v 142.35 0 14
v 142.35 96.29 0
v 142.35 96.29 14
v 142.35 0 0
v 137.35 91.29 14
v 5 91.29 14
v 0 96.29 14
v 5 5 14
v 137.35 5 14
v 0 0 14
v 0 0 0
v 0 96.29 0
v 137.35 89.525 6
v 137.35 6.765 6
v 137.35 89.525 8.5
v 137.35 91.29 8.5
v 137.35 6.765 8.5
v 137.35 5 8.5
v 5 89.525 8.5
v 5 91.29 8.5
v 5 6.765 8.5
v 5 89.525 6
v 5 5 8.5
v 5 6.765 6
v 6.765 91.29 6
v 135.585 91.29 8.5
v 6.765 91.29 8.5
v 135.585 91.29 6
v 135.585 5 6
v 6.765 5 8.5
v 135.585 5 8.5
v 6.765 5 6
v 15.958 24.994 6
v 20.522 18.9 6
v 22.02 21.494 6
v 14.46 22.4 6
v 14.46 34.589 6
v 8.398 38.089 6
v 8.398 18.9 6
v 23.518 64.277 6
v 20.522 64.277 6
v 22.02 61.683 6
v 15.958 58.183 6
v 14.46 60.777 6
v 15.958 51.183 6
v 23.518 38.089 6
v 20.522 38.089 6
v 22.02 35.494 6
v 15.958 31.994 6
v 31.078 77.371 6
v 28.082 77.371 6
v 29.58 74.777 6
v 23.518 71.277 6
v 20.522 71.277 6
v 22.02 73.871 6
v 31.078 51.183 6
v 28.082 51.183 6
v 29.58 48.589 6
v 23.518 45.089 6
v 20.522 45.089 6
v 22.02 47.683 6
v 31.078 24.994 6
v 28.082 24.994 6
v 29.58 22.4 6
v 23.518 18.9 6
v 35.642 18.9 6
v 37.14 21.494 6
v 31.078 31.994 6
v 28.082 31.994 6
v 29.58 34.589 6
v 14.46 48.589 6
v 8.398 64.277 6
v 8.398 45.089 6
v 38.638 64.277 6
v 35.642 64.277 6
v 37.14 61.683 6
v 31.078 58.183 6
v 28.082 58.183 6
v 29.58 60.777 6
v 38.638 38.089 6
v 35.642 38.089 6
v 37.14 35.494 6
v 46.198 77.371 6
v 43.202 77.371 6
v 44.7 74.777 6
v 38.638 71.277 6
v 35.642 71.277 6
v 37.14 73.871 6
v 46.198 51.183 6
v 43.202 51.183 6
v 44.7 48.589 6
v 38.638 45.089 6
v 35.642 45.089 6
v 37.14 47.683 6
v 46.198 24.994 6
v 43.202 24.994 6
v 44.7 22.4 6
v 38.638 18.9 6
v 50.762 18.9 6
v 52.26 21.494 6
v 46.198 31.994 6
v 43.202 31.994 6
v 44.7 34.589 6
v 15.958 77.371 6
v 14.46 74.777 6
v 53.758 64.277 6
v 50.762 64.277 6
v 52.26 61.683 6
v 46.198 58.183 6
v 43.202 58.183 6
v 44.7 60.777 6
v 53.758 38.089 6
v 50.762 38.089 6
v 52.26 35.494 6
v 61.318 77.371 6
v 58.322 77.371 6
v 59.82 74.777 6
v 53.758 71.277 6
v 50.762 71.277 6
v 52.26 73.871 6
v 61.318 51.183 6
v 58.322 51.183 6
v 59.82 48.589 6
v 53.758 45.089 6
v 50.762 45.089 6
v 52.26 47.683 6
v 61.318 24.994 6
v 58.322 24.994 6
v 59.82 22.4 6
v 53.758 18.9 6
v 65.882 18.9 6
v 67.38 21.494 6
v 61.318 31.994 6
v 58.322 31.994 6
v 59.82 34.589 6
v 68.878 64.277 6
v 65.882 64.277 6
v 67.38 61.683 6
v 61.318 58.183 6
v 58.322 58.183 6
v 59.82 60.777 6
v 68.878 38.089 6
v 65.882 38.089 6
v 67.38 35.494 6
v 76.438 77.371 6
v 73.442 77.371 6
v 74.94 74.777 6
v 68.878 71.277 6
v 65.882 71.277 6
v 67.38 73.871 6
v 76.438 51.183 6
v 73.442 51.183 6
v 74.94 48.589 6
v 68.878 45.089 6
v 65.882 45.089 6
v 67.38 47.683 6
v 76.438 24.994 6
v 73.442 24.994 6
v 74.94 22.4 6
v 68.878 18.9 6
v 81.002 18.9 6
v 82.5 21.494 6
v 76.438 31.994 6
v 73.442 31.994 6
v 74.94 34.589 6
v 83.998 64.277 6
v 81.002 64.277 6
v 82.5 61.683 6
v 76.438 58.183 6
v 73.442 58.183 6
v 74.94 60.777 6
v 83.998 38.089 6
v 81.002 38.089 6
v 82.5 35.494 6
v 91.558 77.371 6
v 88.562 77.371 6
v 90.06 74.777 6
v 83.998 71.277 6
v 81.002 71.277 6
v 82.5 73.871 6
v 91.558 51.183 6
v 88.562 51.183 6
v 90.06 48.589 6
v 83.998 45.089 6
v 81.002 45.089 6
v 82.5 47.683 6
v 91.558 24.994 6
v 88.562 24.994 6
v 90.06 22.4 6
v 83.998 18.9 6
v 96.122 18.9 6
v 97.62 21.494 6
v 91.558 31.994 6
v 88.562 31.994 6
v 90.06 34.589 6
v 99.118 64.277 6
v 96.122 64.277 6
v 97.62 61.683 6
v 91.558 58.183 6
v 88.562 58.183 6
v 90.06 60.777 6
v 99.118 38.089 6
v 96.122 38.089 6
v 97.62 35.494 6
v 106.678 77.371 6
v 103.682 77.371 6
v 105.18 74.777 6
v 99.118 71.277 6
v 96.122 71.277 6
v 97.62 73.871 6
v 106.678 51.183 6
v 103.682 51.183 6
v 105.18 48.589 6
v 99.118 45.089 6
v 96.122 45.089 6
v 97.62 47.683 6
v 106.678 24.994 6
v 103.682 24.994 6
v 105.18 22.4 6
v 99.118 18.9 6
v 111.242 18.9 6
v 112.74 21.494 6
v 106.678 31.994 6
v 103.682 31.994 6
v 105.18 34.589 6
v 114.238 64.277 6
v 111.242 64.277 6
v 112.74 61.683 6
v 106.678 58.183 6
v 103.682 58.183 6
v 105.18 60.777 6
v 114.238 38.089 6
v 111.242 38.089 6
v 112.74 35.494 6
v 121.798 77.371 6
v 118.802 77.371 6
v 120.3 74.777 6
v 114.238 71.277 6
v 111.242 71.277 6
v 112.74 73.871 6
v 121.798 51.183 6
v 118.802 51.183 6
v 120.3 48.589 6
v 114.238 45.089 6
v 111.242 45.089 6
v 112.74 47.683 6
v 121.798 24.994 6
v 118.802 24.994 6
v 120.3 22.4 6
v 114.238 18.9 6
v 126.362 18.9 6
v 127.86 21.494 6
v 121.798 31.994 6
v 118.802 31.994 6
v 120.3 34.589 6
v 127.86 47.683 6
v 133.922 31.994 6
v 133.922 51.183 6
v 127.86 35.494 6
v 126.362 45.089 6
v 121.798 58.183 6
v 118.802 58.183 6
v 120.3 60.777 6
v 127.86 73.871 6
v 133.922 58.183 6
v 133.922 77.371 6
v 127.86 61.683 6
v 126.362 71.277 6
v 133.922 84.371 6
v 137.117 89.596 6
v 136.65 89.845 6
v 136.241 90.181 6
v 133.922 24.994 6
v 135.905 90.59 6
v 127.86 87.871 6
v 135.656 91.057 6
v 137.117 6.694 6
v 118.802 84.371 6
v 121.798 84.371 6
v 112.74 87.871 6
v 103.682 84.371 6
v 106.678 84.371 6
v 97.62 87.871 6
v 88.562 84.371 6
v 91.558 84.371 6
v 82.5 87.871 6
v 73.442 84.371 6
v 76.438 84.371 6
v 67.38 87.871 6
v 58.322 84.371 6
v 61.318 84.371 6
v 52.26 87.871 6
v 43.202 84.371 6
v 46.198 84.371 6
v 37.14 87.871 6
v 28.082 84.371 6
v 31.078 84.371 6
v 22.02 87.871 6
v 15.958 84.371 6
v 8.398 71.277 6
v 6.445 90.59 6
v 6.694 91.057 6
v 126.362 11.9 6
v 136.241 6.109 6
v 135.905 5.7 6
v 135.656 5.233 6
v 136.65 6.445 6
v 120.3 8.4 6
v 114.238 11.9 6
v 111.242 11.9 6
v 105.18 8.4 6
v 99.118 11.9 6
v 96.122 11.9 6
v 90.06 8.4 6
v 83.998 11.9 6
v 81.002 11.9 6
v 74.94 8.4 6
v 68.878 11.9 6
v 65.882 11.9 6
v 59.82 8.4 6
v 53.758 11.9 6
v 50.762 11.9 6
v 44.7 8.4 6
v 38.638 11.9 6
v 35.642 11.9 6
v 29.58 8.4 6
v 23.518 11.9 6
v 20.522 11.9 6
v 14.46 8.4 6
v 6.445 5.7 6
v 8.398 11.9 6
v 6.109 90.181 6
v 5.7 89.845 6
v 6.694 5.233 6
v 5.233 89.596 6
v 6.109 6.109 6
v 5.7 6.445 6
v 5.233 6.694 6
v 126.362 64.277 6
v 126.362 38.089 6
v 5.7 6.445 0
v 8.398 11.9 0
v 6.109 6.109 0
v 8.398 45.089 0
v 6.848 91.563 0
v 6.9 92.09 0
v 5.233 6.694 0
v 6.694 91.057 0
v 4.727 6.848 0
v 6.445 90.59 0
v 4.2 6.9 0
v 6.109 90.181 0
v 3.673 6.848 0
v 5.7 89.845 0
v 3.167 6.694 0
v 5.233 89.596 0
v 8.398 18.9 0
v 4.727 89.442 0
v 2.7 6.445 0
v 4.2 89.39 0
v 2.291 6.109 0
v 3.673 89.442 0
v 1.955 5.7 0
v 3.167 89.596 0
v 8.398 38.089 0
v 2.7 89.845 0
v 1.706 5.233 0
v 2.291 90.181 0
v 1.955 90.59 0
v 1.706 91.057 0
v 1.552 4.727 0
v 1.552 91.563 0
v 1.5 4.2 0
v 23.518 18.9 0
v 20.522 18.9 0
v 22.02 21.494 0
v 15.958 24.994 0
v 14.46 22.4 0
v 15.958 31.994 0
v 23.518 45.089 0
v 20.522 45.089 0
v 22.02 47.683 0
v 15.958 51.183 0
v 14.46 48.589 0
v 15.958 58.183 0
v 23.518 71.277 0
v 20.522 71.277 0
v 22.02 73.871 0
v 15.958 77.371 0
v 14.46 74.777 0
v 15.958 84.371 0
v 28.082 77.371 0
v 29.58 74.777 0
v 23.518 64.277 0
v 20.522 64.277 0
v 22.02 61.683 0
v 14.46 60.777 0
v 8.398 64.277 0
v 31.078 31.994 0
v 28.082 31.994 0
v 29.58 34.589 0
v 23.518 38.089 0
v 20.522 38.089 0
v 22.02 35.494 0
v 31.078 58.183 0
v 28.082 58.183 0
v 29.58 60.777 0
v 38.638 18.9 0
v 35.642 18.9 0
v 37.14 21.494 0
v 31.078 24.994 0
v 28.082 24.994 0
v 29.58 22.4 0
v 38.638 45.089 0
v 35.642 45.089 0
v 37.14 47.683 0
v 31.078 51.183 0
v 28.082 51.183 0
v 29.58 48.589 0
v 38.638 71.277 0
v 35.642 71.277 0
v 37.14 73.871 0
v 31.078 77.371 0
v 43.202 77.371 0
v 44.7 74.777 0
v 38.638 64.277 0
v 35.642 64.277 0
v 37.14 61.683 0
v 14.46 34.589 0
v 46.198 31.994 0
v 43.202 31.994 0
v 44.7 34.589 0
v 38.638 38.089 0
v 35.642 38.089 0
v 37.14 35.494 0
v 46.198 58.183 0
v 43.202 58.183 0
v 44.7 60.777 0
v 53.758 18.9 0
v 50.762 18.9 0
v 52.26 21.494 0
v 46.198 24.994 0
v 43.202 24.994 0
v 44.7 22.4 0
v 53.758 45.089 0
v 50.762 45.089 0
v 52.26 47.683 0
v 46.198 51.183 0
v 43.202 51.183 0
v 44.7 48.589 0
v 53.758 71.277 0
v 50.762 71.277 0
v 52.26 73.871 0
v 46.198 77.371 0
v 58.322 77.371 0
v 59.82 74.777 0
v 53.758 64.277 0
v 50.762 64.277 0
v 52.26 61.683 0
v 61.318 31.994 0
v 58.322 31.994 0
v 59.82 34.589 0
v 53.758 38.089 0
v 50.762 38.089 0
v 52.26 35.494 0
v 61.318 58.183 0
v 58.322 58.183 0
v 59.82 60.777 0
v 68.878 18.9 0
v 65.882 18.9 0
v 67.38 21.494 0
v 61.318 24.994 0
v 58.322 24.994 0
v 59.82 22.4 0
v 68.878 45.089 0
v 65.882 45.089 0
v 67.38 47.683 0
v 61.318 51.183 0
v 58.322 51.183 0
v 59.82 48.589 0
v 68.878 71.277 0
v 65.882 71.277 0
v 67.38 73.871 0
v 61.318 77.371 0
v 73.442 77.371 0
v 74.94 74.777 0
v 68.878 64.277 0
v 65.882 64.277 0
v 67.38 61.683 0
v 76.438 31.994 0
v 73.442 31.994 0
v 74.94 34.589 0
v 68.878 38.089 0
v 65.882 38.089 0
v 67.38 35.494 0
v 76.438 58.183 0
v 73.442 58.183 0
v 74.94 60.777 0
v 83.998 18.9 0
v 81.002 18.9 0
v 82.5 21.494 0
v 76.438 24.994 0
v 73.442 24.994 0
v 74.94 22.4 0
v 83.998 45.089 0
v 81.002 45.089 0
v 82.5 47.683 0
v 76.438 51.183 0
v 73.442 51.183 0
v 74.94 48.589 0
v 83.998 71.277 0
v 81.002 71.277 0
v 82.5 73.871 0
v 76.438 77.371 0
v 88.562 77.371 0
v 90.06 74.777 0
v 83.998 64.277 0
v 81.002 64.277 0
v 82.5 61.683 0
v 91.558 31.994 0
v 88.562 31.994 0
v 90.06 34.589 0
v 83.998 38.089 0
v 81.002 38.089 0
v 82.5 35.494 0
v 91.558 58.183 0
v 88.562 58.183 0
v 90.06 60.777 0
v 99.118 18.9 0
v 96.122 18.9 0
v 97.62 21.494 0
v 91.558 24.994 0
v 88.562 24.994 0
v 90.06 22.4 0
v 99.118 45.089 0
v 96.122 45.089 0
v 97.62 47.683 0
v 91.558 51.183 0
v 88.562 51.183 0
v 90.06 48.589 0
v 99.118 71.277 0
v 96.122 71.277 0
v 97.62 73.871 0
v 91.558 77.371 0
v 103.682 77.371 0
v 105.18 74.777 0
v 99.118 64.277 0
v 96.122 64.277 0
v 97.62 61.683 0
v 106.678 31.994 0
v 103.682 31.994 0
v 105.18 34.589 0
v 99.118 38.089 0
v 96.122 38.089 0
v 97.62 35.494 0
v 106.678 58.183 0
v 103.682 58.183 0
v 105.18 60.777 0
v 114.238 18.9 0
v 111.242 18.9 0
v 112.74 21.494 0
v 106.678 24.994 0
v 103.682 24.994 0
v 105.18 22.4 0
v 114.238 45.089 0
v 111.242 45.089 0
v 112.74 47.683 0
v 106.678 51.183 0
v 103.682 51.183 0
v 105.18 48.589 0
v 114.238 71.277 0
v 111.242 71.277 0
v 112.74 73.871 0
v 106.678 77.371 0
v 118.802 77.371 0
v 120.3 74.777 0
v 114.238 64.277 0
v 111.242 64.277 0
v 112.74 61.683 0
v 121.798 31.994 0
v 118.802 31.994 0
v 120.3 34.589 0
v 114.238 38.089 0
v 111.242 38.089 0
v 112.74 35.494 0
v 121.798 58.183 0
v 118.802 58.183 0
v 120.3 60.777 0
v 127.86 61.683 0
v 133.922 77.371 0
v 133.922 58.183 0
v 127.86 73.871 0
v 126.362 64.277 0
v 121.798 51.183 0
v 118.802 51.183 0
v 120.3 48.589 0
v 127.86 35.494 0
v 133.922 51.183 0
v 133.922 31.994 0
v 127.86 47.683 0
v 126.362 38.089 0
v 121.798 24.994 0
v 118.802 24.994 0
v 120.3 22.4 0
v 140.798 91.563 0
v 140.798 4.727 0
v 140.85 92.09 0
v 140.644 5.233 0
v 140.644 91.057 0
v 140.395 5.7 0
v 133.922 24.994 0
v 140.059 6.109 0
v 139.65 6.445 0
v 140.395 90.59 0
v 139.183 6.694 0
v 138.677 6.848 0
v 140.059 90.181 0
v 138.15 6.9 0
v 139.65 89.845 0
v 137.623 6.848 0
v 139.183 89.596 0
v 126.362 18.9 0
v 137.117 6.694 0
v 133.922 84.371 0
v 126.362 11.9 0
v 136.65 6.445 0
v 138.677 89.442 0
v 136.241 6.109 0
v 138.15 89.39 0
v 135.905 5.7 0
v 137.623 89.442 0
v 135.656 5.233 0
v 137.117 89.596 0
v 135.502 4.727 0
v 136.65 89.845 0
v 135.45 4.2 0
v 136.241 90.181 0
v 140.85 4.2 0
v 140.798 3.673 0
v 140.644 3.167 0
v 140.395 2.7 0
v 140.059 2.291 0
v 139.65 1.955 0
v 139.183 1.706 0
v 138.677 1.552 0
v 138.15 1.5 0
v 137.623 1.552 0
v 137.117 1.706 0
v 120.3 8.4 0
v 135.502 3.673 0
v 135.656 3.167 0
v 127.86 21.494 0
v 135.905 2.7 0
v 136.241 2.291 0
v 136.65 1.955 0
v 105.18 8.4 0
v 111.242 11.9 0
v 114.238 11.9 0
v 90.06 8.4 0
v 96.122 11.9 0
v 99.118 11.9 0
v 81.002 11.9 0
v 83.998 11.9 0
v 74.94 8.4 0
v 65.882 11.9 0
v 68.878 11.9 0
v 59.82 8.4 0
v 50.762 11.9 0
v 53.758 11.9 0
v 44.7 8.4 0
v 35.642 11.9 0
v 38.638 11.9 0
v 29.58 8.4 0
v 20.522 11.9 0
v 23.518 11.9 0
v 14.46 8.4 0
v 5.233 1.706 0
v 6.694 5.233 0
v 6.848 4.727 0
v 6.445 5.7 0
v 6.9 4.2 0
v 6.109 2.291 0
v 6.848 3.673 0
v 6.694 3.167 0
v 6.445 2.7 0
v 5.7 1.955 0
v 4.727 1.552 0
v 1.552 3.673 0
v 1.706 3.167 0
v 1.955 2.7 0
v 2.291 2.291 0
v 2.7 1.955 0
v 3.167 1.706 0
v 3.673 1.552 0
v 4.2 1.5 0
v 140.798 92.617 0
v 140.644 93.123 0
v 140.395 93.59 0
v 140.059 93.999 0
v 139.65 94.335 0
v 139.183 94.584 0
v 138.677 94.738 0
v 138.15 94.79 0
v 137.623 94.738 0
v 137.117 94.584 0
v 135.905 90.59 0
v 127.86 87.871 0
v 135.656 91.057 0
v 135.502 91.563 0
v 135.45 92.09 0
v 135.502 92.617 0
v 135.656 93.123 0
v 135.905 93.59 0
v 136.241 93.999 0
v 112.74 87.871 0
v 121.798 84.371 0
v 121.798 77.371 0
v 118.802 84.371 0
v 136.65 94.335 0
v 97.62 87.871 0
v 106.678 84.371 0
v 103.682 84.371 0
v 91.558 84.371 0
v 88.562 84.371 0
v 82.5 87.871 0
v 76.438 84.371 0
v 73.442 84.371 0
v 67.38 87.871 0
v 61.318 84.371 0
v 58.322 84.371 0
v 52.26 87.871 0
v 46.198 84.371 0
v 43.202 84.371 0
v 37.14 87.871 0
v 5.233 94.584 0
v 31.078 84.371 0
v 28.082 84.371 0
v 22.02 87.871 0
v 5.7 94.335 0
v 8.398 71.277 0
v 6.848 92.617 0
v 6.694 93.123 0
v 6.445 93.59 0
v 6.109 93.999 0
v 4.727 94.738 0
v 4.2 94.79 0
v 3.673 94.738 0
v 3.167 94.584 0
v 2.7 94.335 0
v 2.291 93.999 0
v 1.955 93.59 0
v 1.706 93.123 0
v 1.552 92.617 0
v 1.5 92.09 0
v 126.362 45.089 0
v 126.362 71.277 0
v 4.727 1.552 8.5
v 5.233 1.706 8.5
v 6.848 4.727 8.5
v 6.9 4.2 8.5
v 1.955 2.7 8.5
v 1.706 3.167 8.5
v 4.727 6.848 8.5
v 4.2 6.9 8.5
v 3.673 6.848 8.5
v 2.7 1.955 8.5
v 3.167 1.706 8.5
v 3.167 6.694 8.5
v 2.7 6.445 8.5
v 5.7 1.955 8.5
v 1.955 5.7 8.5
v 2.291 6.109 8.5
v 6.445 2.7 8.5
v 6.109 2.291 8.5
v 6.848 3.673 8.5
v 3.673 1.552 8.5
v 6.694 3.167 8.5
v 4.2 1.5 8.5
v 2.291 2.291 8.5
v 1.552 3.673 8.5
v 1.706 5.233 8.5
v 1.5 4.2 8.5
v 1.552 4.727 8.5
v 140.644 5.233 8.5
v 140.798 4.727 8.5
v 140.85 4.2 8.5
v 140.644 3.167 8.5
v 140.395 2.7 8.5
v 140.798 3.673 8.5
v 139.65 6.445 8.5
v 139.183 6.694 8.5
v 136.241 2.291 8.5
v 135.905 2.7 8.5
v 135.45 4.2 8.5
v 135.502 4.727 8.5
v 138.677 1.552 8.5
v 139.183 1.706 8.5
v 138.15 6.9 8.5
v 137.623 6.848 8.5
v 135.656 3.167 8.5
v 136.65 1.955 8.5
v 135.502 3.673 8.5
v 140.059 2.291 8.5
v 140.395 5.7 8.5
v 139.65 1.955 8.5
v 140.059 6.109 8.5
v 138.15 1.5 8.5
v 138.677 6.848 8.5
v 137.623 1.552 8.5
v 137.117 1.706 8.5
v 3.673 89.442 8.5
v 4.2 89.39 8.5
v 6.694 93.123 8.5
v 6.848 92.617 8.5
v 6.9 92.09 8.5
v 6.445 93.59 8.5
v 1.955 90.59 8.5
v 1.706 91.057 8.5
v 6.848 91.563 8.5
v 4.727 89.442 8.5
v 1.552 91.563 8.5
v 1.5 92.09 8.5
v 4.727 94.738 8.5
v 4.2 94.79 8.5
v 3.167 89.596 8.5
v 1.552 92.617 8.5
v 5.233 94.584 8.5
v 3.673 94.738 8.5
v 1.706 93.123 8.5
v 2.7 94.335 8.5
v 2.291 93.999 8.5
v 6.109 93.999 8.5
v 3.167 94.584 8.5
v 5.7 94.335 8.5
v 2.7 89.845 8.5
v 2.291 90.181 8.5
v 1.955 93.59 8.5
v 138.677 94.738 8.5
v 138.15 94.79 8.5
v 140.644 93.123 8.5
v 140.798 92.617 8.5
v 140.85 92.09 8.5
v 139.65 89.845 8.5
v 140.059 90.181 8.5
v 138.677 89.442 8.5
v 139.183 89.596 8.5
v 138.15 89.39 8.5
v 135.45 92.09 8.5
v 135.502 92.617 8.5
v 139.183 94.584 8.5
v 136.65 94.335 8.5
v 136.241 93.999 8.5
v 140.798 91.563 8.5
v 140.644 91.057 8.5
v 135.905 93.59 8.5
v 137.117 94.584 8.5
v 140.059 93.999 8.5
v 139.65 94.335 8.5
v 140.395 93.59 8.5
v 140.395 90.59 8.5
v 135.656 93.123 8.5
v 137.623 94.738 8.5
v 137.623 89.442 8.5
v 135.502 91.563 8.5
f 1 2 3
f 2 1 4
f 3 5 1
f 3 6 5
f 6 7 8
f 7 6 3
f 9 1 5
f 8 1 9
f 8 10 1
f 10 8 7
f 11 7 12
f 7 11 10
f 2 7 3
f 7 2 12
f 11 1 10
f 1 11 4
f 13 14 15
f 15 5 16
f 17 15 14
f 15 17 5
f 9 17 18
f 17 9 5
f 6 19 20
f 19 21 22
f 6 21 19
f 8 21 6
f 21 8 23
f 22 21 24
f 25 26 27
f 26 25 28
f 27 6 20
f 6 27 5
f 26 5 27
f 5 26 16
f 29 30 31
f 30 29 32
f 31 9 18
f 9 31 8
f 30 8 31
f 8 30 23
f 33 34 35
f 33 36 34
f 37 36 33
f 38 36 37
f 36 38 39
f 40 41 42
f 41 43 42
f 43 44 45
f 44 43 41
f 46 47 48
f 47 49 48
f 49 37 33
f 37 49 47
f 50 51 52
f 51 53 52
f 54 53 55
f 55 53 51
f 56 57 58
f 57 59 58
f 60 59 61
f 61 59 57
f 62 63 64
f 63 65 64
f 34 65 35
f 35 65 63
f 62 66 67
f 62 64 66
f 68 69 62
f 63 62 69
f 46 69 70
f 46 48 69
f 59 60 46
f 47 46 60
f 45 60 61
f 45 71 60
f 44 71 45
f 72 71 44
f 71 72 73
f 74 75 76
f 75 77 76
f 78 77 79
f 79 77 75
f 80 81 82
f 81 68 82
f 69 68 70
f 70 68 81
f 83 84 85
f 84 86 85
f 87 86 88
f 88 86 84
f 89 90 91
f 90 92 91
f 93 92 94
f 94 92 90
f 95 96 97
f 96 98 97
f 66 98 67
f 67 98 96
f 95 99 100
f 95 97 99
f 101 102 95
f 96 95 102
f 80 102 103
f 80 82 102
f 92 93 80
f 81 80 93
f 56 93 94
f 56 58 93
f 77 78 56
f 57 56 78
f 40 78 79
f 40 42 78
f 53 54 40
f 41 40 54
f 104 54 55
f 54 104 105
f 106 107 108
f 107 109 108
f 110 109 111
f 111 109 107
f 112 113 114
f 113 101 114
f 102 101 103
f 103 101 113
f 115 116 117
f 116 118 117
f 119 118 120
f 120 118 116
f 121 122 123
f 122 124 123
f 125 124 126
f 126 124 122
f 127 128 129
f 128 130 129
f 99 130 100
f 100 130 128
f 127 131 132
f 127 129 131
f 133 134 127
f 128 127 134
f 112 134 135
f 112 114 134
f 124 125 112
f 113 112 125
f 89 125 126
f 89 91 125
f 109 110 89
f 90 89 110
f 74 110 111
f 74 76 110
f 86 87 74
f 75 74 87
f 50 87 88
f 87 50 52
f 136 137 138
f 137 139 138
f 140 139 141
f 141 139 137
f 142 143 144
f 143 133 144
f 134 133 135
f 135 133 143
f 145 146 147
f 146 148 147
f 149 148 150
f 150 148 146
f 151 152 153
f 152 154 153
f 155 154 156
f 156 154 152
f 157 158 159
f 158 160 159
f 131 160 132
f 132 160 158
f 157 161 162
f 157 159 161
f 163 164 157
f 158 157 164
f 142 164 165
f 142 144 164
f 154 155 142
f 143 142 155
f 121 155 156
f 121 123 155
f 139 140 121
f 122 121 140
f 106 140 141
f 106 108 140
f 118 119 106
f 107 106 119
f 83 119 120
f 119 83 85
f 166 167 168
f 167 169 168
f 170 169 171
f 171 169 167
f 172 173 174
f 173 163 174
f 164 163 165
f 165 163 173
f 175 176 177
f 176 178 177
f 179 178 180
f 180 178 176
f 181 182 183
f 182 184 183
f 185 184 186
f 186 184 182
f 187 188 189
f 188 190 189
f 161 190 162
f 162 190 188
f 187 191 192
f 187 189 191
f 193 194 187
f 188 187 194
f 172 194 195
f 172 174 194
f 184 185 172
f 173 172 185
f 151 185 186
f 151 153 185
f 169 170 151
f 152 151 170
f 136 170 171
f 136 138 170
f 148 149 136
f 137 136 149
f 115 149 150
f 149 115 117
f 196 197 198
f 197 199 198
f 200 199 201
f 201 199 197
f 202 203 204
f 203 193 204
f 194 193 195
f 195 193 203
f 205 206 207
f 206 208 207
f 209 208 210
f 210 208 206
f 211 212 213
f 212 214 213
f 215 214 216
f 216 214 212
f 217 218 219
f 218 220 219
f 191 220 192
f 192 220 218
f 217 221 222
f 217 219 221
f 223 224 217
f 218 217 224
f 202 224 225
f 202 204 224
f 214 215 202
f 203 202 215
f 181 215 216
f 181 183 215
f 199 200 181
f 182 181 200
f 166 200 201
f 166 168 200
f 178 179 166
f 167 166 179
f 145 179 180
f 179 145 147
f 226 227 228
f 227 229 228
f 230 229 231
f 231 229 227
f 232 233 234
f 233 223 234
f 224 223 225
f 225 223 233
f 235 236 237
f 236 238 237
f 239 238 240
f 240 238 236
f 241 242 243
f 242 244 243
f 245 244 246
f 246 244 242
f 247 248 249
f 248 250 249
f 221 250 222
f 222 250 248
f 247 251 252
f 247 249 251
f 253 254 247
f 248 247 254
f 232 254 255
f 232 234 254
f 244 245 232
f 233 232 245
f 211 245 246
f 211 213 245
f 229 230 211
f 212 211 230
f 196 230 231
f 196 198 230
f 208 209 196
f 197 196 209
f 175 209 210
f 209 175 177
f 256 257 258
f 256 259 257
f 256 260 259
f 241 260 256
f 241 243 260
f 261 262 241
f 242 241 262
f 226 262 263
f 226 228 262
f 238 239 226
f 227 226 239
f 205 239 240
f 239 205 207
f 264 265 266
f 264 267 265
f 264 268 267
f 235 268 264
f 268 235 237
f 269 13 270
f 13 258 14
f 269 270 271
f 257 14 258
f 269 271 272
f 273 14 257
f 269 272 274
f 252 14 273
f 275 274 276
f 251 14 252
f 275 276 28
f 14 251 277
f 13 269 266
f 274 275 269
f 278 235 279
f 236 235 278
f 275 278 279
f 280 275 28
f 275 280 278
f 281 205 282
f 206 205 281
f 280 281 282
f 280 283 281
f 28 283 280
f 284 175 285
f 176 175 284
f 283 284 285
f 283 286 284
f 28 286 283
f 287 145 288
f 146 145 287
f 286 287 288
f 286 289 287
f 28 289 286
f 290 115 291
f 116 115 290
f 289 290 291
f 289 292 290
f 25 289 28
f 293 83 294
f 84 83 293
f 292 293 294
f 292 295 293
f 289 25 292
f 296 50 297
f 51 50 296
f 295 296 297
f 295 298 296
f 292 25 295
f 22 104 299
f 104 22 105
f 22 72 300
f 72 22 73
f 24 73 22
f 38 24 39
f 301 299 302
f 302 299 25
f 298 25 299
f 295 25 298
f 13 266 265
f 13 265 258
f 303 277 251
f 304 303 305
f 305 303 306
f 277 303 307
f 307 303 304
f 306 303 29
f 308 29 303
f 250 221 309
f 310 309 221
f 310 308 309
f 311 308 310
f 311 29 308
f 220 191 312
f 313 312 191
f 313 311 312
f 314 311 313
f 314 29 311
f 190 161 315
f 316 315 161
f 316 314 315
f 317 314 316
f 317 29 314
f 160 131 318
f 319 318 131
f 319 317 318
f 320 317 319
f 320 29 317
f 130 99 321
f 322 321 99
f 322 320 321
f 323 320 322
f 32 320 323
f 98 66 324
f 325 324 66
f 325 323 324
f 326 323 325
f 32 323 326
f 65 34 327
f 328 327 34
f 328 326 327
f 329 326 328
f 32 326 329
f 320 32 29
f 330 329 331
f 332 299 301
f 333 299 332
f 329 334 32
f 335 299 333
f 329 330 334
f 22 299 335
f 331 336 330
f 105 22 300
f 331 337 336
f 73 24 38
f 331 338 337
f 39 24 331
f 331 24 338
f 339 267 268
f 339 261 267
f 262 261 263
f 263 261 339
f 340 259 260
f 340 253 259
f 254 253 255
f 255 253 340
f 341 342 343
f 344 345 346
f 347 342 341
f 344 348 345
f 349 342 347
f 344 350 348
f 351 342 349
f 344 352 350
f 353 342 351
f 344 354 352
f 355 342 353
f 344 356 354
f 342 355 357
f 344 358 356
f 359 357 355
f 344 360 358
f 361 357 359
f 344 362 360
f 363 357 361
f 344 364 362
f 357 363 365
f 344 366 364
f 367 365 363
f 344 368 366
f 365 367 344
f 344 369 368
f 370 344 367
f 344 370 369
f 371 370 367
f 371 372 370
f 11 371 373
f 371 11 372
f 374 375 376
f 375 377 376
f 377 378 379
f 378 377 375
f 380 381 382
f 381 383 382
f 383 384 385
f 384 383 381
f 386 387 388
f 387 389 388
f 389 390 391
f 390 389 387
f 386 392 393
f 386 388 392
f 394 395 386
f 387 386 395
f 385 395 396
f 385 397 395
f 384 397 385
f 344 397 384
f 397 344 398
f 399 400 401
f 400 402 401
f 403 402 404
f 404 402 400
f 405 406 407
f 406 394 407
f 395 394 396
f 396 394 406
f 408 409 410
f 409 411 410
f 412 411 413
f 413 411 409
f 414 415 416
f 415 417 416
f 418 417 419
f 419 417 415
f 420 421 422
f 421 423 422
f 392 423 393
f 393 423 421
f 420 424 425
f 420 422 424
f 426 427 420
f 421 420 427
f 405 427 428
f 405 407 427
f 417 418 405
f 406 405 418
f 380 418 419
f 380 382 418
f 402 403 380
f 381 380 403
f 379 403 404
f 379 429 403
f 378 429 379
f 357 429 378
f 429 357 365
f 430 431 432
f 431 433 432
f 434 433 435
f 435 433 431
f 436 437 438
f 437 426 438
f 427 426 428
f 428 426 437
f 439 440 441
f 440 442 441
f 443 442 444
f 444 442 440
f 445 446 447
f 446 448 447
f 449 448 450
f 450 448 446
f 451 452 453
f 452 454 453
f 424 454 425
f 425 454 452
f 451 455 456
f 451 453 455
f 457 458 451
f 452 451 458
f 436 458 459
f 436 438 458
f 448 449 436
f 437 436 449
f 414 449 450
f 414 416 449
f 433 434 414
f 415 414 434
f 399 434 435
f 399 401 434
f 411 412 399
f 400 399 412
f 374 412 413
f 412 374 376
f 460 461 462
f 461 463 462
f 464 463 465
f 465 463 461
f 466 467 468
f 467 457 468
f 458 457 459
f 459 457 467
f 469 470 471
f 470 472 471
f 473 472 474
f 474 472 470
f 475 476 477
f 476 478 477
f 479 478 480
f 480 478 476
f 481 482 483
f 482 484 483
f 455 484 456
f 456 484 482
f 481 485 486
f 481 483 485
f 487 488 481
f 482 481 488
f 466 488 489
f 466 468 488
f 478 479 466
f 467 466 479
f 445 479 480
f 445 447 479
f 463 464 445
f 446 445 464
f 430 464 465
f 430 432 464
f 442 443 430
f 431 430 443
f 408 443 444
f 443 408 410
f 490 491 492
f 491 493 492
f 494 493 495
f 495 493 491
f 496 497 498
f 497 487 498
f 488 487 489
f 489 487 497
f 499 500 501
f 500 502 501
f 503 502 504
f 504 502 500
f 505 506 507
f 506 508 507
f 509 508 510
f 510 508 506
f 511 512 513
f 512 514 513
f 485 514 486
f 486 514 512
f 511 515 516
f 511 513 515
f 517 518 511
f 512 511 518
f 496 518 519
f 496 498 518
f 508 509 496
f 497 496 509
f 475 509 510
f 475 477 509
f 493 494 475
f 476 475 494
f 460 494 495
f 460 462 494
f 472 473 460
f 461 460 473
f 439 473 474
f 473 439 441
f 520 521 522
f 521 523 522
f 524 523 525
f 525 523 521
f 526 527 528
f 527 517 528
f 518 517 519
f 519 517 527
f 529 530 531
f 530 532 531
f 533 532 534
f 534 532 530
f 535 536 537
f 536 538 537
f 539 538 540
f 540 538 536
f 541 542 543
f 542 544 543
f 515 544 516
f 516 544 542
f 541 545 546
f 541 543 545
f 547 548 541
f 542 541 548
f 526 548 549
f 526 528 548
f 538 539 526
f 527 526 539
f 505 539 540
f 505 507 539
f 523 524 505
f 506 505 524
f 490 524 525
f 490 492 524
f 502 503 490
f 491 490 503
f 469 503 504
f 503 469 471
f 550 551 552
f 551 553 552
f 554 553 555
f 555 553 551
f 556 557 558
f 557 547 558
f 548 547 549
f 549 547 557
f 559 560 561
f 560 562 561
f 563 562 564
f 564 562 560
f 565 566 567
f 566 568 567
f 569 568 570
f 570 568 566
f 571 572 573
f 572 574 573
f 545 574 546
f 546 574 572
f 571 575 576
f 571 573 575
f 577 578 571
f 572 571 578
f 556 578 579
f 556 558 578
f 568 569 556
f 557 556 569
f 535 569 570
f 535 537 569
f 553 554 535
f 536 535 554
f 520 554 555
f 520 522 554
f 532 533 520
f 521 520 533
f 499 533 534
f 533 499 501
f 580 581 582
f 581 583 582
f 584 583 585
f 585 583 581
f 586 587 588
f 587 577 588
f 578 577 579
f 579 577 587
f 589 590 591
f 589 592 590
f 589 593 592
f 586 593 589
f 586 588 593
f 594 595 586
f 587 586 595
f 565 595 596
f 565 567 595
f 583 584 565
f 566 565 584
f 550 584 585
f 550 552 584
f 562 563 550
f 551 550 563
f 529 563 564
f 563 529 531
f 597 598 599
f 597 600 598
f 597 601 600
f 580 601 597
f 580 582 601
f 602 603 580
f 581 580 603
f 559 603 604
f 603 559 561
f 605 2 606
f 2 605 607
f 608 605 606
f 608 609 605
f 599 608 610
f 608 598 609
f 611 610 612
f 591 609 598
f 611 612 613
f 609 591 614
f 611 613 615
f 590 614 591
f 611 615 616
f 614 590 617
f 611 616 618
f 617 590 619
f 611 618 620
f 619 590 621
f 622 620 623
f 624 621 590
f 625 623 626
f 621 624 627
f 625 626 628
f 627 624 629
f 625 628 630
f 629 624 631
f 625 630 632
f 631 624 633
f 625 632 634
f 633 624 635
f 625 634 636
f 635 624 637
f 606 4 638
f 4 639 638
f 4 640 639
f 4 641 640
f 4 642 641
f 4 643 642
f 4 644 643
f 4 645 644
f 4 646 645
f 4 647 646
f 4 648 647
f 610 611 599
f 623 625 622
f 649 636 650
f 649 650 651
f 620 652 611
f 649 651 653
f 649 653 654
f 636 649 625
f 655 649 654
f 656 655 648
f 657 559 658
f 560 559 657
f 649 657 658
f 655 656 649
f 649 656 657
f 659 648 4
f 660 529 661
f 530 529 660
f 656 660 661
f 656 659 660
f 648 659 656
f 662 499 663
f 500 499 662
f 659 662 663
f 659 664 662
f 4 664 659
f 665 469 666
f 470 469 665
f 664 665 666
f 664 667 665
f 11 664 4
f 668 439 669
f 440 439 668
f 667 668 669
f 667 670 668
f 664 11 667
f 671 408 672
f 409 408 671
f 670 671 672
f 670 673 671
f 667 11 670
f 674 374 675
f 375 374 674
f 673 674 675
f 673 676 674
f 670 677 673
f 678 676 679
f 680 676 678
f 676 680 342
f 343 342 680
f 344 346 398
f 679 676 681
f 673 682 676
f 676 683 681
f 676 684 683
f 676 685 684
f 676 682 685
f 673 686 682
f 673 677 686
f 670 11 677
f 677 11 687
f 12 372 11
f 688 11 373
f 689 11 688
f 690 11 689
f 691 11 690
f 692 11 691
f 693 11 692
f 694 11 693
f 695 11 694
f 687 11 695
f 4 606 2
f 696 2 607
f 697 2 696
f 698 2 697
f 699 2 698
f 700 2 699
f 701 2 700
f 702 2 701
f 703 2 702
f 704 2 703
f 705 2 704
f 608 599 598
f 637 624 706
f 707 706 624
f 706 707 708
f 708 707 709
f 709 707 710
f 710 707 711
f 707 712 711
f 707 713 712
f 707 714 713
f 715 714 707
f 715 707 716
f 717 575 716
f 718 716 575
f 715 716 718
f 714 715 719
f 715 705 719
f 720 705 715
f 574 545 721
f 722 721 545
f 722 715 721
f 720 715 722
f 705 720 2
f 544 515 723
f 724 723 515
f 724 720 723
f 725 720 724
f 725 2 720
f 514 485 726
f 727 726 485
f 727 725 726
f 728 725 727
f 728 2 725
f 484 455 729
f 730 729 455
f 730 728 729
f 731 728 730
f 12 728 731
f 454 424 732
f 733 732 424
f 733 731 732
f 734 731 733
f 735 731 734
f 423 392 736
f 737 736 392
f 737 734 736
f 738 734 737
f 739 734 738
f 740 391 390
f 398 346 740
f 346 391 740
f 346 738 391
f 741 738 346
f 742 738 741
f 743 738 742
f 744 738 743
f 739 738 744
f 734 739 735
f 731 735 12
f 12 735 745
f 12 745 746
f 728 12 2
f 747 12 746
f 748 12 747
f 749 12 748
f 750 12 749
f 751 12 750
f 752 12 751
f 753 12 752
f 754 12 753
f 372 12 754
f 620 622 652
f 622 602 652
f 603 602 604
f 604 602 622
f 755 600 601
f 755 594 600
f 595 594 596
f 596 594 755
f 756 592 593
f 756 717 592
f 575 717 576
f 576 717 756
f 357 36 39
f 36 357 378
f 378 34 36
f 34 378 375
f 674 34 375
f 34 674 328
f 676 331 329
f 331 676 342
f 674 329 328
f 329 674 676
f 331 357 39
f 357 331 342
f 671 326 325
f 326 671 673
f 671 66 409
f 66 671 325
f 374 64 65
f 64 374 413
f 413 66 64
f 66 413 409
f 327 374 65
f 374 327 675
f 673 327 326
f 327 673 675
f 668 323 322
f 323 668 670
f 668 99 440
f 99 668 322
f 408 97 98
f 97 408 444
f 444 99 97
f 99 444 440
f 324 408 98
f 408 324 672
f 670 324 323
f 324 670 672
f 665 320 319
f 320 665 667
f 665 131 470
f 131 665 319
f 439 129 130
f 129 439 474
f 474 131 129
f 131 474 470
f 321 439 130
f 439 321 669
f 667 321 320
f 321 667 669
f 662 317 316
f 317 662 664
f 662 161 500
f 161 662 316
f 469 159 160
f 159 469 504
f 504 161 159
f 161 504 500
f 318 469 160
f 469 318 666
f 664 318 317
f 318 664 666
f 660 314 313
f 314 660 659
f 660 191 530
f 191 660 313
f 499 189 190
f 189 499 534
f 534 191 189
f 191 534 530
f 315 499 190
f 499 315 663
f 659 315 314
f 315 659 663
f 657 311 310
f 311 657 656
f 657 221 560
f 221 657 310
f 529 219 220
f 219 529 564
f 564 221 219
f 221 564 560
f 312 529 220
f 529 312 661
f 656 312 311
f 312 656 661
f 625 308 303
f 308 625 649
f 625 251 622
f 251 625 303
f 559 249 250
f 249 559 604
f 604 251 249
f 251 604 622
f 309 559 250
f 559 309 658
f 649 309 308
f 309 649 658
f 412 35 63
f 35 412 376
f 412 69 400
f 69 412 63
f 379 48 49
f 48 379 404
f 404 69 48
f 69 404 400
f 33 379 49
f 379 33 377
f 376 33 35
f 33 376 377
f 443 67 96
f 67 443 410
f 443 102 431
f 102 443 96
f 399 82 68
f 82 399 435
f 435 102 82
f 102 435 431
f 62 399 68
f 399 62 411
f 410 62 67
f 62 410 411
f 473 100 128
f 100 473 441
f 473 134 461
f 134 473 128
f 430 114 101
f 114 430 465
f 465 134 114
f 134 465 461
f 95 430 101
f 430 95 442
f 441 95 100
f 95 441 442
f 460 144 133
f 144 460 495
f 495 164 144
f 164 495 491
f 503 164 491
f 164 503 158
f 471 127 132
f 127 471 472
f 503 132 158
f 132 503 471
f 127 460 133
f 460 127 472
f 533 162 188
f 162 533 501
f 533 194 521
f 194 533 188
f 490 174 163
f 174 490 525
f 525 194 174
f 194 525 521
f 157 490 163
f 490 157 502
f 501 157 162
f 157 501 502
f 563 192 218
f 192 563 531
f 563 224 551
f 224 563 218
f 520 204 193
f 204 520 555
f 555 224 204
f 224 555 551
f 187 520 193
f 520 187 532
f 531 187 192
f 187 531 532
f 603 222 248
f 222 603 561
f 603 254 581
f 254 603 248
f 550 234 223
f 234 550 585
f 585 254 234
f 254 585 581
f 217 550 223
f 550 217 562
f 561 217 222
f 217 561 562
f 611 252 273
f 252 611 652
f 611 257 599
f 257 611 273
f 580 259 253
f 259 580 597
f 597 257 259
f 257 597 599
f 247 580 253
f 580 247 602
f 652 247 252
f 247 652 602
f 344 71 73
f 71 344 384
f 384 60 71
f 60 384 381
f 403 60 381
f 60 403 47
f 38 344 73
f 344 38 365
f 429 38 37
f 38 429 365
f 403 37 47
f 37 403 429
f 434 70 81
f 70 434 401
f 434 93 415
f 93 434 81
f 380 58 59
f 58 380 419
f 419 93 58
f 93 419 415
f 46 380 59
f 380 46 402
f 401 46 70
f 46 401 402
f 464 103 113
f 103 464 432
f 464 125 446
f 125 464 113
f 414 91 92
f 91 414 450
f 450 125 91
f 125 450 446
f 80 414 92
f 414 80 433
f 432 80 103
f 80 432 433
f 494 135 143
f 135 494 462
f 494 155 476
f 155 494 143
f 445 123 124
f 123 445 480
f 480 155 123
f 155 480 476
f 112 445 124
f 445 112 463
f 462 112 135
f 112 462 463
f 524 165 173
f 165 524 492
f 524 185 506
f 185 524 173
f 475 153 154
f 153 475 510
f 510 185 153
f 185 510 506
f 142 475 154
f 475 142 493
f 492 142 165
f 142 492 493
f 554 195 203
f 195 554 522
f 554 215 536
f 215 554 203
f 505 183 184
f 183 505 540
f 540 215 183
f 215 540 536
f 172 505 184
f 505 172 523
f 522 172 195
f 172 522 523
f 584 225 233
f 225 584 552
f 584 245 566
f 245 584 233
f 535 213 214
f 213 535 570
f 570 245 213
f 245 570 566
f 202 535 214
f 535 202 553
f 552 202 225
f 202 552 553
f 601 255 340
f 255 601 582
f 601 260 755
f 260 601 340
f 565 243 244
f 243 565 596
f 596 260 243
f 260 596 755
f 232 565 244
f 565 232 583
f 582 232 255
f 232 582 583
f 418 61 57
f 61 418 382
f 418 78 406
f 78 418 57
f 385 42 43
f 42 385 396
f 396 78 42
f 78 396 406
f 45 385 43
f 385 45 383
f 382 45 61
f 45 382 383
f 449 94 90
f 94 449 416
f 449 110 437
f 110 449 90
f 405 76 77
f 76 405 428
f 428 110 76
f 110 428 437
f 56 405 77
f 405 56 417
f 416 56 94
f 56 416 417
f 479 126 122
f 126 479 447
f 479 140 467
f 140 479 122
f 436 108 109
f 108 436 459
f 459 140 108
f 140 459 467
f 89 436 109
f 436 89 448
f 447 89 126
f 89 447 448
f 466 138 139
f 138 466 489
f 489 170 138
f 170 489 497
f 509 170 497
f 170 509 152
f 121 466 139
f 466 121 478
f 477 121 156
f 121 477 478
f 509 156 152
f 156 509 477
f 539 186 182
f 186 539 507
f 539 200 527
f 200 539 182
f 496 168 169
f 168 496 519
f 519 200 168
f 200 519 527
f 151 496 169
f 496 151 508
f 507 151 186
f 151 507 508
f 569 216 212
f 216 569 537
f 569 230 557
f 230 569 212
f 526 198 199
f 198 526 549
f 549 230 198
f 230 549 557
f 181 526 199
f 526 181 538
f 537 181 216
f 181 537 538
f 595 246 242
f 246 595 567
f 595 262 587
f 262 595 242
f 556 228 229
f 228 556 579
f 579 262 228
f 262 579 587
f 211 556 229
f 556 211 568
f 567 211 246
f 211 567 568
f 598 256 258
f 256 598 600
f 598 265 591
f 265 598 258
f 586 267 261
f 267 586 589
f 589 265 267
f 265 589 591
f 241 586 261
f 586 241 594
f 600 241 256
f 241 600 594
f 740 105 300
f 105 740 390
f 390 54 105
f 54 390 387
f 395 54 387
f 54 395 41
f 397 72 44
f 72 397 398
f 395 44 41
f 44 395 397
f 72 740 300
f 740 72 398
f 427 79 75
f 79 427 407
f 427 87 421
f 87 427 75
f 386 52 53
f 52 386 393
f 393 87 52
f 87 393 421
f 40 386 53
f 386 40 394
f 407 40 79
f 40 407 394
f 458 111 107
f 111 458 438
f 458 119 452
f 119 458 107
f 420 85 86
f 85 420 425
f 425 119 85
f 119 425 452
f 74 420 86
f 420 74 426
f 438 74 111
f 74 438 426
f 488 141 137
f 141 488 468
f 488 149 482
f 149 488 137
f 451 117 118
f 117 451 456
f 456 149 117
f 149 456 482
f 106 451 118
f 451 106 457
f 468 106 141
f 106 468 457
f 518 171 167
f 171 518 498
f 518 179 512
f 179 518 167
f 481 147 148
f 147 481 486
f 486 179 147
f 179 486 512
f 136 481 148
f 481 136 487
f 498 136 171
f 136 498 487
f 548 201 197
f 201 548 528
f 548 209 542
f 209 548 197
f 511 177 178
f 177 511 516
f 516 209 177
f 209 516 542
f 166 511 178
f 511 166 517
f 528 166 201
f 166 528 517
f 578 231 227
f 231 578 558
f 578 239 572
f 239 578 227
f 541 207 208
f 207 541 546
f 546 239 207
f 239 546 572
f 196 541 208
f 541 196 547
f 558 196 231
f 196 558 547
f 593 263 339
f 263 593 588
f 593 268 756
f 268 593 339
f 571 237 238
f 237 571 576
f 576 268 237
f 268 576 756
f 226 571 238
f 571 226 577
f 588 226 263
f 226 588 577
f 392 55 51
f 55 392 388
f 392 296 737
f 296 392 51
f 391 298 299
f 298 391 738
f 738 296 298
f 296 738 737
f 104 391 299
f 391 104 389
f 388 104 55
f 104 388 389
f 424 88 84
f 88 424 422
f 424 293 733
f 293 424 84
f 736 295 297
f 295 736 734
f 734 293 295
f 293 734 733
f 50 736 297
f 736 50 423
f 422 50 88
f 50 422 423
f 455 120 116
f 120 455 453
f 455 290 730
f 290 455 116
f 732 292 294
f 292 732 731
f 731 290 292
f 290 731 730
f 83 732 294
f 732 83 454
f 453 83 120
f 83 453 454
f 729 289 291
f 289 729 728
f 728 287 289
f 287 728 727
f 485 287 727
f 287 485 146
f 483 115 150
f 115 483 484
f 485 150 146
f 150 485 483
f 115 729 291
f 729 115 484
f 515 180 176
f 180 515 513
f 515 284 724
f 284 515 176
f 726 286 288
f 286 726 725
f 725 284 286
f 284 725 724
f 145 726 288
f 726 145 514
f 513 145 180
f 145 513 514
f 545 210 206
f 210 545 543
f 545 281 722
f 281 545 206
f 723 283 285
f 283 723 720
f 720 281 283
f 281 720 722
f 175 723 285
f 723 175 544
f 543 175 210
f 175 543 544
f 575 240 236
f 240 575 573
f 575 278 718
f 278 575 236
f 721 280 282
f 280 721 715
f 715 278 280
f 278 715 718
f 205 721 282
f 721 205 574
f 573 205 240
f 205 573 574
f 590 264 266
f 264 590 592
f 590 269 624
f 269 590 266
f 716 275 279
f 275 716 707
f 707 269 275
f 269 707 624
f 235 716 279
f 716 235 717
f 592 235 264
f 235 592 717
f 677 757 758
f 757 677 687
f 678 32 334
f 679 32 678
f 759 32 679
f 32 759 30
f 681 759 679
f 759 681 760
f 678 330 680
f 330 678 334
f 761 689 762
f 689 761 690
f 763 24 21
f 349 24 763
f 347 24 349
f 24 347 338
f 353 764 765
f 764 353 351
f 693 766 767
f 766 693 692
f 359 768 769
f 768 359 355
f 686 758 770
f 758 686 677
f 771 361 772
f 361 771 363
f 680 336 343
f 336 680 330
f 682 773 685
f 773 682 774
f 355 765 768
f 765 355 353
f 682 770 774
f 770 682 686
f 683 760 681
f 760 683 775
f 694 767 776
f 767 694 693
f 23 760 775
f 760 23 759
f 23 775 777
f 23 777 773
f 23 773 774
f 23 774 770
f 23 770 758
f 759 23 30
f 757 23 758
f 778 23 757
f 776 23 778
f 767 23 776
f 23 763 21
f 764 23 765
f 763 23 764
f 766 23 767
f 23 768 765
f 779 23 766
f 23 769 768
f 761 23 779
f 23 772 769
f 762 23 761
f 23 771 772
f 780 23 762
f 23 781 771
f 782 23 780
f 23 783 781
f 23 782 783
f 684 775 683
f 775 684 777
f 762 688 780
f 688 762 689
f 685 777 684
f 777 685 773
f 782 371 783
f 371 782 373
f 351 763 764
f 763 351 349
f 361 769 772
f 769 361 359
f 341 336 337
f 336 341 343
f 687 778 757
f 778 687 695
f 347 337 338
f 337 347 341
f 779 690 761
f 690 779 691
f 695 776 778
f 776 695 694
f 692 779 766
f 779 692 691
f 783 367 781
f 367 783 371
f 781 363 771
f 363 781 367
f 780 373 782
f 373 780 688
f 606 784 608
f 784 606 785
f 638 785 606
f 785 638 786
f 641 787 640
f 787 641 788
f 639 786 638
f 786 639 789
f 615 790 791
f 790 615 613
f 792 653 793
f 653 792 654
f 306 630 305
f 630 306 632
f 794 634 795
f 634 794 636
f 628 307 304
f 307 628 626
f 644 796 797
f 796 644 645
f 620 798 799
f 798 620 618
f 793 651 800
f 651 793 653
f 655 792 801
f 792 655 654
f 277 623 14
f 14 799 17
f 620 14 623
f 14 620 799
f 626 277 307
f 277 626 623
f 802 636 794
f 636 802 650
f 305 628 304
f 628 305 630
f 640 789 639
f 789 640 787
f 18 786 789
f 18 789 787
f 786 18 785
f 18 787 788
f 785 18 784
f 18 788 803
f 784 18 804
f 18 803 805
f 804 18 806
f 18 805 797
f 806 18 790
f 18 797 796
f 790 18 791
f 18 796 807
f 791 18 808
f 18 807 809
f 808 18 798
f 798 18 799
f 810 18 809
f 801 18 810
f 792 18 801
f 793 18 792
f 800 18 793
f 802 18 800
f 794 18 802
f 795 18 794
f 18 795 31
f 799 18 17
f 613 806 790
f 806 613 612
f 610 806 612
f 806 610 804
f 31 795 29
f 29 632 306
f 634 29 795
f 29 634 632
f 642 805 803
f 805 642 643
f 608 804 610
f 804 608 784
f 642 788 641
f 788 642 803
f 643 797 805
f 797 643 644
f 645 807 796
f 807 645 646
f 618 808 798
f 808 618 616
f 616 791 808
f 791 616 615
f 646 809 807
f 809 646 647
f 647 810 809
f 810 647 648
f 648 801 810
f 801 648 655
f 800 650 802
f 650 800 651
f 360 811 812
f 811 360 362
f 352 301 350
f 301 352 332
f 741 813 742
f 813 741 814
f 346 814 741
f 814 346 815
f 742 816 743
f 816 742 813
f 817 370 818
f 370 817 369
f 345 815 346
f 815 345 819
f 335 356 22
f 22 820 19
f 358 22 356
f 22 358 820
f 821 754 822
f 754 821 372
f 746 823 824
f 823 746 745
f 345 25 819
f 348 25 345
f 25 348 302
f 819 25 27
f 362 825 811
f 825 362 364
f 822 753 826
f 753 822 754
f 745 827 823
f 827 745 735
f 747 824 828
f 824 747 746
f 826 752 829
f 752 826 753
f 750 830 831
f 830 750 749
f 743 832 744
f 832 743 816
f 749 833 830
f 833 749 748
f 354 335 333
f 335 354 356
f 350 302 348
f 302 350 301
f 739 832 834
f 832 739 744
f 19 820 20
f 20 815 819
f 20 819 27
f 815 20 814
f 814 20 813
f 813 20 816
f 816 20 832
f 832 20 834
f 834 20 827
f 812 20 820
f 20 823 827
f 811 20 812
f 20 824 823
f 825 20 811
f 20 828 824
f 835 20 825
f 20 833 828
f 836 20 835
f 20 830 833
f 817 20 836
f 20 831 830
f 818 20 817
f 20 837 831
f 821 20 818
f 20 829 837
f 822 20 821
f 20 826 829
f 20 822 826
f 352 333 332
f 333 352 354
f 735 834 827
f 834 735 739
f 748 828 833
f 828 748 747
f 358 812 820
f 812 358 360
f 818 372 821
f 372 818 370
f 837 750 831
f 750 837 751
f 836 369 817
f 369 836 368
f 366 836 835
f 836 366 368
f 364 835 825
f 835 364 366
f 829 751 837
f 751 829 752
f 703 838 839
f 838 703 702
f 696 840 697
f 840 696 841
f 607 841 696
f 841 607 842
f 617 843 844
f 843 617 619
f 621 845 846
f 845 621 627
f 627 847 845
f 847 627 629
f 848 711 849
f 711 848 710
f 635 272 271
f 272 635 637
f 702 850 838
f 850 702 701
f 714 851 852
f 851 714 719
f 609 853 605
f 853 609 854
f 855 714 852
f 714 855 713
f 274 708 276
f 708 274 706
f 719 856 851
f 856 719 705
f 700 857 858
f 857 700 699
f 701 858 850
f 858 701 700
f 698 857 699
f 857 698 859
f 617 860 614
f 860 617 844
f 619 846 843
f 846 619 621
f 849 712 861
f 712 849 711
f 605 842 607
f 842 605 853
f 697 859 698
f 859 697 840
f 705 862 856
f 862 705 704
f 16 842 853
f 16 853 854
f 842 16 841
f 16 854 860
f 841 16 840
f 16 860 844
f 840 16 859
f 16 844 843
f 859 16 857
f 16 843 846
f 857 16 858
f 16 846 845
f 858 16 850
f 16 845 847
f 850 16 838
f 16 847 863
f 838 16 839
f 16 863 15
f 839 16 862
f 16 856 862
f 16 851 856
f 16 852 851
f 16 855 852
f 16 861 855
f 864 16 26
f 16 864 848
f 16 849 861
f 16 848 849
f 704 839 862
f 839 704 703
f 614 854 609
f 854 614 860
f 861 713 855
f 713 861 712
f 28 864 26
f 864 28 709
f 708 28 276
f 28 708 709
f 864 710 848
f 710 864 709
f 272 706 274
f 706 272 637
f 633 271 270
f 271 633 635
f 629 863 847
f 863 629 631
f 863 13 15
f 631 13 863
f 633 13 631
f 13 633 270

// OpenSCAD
$fn = 32;

// ----------------------------------------------------------------------
// Honeycomb panel: 142.35 x 96.29 mm, 48 cells of 14 mm
// ----------------------------------------------------------------------

// --- parameters (mm) ---
panel_w = 142.35;         // panel width
panel_d = 96.29;          // panel depth
thick = 6;                // panel thickness
cell_r = 7;               // hex cell circumradius
pitch = 15.12;            // hex cell pitch (centre to centre)
web = 3;                  // web between the cells
columns = 8;              // columns of cells
rows = 6;                 // rows of cells
cell_count = 48;          // total cells
shift_x = 14.46;          // first cell offset in x
shift_y = 15.4;           // first cell offset in y
mount_d = 5.4;            // corner mounting holes
hole_off = 4.2;           // mounting hole offset from the corners
rim_h = 14;               // rim height
rim_t = 5;                // rim wall thickness

difference() {
  union() {
    cube([panel_w, panel_d, thick]);
    /* rim around the panel, sunk 1 mm into the plate */
    translate([0, 0, thick - 1]) difference() {
      cube([panel_w, panel_d, rim_h - thick + 1]);
      translate([rim_t, rim_t, -2.5]) cube([panel_w - 2 * rim_t, panel_d - 2 * rim_t, rim_h - thick + 6]);
    }
  }
  /* hexagonal cells, point-up, cut right through the plate */
  for (row = [0 : rows - 1]) {
    for (col = [0 : columns - 1]) {
      translate([shift_x + col * pitch + (row % 2) * pitch / 2, shift_y + row * pitch * 0.866025, -2.5]) rotate([0, 0, 30]) cylinder(h = thick + 5, d = 2 * cell_r, $fn = 6);
    }
  }
  /* corner mounting holes, clear of the outer cell web */
  translate([4.2, 4.2, -2.5]) cylinder(h = thick + 5, d = mount_d);
  translate([138.15, 4.2, -2.5]) cylinder(h = thick + 5, d = mount_d);
  translate([4.2, 92.09, -2.5]) cylinder(h = thick + 5, d = mount_d);
  translate([138.15, 92.09, -2.5]) cylinder(h = thick + 5, d = mount_d);
}
